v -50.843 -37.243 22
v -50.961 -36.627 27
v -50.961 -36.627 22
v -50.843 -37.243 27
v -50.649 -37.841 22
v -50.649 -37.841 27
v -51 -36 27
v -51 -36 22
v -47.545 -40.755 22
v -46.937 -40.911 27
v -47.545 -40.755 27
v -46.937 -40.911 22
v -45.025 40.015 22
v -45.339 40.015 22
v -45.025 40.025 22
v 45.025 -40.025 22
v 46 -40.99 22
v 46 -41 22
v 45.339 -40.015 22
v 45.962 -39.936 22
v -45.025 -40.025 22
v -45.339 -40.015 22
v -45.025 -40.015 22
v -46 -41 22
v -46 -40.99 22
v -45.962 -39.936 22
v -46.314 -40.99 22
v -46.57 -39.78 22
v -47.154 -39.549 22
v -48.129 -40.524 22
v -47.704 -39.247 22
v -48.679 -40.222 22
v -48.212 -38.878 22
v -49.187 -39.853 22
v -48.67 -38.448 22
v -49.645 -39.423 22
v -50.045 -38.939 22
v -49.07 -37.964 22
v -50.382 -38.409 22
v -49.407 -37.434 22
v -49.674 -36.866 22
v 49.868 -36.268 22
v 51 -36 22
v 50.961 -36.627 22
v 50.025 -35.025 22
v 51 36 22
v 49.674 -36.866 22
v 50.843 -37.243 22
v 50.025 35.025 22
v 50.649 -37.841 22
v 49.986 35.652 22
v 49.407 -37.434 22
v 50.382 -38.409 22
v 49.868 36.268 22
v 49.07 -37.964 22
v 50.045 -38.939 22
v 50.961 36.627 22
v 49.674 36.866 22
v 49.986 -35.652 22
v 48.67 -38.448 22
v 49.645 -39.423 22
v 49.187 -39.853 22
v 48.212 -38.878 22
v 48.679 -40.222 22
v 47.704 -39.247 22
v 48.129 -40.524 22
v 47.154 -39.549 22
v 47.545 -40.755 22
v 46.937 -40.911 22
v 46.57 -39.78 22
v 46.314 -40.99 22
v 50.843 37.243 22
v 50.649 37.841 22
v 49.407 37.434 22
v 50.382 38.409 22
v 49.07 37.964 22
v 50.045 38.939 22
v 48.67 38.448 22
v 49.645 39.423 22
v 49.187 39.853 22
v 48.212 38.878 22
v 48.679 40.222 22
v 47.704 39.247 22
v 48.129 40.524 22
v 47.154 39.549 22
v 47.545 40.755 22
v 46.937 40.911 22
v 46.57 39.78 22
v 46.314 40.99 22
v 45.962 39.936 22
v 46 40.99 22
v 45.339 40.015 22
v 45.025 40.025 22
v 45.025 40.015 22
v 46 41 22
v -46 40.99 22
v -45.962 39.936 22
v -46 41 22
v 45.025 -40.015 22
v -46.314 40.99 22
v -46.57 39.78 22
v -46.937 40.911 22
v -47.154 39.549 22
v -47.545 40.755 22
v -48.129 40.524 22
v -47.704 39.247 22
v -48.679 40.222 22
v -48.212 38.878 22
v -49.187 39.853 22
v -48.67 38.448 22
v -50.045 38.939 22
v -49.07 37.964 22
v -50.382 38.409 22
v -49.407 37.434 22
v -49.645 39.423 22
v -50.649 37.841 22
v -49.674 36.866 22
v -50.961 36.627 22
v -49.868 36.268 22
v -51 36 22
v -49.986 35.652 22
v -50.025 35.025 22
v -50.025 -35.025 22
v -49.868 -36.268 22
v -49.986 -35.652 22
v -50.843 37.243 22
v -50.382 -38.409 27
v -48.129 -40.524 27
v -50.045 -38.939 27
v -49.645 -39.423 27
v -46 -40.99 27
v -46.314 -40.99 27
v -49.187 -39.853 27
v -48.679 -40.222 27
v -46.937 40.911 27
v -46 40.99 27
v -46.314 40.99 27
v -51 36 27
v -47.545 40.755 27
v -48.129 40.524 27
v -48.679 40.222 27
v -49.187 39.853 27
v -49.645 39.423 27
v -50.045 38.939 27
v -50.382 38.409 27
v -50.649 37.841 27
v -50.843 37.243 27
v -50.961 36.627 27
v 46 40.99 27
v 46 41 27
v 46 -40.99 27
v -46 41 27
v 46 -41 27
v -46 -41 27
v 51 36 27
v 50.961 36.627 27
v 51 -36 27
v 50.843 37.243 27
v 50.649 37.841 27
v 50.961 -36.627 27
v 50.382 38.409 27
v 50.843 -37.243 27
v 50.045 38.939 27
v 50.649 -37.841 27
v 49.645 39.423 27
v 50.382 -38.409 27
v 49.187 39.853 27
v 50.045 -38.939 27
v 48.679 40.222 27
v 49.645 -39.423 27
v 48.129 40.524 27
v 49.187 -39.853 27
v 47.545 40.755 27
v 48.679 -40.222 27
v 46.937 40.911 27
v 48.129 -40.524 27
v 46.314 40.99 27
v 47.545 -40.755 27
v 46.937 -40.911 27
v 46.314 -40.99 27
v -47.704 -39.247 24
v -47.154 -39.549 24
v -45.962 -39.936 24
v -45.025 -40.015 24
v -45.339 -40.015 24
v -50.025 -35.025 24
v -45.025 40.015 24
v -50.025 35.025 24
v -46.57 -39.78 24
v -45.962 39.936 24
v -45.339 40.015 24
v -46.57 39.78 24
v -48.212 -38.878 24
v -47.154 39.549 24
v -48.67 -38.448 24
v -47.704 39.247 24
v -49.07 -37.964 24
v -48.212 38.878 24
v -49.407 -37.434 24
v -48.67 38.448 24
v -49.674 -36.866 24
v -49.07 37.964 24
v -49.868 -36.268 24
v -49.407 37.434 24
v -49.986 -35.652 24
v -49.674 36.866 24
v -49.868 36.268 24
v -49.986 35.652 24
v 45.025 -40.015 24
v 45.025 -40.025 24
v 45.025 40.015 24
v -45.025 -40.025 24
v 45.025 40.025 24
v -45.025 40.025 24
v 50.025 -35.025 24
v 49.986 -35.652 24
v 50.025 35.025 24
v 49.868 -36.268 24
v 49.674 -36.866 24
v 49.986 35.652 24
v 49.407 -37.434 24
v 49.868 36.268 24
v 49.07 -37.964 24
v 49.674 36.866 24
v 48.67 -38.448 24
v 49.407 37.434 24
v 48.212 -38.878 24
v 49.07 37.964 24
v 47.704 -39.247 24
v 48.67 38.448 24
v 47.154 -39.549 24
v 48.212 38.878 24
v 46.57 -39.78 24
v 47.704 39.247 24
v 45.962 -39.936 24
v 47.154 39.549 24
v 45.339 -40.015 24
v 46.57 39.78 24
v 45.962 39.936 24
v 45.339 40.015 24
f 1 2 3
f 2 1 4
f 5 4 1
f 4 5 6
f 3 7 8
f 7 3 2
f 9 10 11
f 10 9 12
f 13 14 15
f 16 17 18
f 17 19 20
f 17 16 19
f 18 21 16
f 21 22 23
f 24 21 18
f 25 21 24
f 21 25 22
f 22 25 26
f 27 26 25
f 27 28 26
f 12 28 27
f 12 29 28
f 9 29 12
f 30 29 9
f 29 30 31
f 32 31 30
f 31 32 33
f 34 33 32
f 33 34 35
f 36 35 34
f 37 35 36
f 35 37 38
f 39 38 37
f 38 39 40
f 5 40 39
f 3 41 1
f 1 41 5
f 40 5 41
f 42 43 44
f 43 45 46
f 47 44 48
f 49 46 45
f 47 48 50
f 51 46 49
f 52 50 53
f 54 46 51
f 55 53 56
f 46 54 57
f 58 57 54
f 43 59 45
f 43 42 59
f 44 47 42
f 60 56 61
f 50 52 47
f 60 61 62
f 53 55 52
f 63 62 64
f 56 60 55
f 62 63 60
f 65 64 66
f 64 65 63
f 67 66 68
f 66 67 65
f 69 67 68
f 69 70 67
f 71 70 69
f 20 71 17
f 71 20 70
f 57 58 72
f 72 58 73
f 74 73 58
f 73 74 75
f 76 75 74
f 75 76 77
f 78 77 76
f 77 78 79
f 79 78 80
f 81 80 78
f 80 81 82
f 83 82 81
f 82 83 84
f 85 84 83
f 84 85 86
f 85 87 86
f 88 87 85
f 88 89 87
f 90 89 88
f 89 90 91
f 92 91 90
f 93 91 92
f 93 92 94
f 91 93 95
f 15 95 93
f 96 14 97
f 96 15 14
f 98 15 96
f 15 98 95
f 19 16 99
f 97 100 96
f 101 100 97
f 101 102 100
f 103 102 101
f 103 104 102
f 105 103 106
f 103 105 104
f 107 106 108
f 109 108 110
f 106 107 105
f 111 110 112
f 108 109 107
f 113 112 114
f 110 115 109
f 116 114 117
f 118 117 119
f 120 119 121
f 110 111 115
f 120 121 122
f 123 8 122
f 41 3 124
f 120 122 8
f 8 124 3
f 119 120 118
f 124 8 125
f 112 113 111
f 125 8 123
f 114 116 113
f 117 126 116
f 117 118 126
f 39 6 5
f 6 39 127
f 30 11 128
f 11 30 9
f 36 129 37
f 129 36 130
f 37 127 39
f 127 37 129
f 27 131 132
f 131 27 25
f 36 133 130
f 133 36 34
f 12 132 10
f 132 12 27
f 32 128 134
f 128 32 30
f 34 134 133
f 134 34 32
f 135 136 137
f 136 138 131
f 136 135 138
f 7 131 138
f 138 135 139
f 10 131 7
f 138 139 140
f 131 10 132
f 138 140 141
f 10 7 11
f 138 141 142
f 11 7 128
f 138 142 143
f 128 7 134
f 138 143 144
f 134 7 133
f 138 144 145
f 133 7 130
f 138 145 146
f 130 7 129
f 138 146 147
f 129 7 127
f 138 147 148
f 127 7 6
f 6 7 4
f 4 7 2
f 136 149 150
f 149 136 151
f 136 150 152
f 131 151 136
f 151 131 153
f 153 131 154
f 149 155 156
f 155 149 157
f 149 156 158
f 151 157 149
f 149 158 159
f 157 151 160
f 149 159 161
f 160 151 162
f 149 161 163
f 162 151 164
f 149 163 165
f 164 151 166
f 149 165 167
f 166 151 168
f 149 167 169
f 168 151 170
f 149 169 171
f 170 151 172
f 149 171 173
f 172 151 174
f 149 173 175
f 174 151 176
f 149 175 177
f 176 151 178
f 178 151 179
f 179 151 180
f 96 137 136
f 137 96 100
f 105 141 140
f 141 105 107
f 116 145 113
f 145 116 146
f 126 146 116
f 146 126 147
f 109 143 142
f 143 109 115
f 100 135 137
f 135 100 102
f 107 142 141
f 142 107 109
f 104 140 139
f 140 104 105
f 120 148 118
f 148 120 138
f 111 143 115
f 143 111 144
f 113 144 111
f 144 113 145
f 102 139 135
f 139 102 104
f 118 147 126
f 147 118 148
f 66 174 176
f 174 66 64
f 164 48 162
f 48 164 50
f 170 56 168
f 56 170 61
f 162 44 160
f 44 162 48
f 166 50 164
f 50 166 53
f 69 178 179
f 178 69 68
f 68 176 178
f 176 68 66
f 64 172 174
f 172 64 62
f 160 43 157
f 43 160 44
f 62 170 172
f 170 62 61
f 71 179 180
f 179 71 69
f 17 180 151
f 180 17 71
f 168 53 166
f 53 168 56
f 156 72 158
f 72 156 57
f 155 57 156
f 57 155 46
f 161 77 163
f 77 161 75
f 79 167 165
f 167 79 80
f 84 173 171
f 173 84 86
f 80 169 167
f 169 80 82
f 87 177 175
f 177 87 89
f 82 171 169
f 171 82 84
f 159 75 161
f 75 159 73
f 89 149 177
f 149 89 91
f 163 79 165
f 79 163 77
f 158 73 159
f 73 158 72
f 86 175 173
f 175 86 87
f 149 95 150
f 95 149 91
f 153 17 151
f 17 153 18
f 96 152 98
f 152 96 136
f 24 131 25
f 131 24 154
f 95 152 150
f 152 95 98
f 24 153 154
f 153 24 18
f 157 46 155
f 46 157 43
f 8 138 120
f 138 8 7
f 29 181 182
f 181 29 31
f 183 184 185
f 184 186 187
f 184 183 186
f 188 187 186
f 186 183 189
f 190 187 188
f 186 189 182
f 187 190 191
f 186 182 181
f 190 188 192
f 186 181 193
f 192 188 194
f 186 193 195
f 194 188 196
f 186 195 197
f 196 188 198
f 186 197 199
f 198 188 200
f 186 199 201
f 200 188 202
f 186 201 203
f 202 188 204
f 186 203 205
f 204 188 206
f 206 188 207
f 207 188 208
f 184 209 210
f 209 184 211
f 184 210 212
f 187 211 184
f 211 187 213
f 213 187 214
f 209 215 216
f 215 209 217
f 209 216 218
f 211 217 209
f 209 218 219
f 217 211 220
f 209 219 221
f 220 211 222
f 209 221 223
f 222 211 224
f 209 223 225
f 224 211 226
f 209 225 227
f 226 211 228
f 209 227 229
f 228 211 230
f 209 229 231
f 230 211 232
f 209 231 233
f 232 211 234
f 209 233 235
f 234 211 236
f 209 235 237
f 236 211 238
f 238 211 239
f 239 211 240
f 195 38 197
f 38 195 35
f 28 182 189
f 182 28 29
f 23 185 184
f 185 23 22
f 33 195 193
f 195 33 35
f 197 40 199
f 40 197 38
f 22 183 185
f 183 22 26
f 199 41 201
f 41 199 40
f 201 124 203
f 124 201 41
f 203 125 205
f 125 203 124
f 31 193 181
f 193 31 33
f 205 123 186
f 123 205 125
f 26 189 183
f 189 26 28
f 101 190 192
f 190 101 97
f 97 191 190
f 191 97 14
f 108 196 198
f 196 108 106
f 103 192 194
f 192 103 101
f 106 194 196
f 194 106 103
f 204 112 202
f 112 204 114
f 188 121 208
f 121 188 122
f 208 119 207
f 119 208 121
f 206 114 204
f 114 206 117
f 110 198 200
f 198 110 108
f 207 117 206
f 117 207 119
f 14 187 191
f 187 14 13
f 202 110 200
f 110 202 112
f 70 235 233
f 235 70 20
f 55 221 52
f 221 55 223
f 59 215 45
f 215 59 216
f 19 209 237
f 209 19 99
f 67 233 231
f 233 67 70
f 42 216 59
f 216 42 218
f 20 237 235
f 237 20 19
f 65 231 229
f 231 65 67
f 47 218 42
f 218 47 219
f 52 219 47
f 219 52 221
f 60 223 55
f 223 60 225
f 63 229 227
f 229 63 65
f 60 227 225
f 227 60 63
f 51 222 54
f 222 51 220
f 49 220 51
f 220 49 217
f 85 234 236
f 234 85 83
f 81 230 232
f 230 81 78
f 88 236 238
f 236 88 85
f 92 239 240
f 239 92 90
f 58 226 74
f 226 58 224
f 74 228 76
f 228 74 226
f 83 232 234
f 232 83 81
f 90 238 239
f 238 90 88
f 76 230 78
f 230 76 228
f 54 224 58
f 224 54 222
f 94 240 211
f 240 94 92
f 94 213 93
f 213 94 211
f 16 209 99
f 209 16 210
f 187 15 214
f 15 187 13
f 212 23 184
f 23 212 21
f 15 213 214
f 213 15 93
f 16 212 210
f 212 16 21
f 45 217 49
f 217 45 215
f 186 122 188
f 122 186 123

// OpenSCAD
include <MCAD/boxes.scad>
include <MCAD/nuts_and_bolts.scad>

$fn = 50;

pcb_dim = [ 90, 70, 10];
hole_size = 2.4;

//height of case bottom
h = 24;
//height of base top
h_t = 5;

pcb_case_top();
//pcb_case_bottom();
//pcb_case_top();

//pcb(10);
//_pcb_holes(1,10);

module pcb_case_bottom()
{
    difference()
    {
        union()
        {
            _pcb_case_bottom();
            _pcb_holes(5,10);
        }
        _pcb_holes(2/2,10);
        pcb(10);
    }
}

module _pcb_case_bottom()
{
    
    translate([0,0,(h+pcb_dim[2]+10)/2]) difference()
    {
        roundedBox([pcb_dim[0]+10, pcb_dim[1]+10, h+pcb_dim[2]+10], 5, true);
        translate([0,0,3]) roundedBox([pcb_dim[0]+8, pcb_dim[1]+8, h+pcb_dim[2]+10], 5, true);
    }
}

module pcb_case_top()
{
    difference()
    {
       _pcb_case_top(h)
       #pcb(20);
    }
}

module _pcb_case_top(ht)
{
    translate([0,0,h_t/2-2 + ht]) difference()
    {
        roundedBox([pcb_dim[0]+12, pcb_dim[1]+12, h_t], 5, true);
        translate([0,0,-h_t+2]) roundedBox([pcb_dim[0]+10.05, pcb_dim[1]+10.05, h_t], 5, true);
    }
}

module pcb(ht)
{
    translate([-pcb_dim[0]/2, -pcb_dim[1]/2,ht]) 
    {
        cube( pcb_dim );
        translate([pcb_dim[0] - 14, 0, ht]) cube([14,19,24]);
        for( i = [ 0:4 ] )
            translate([pcb_dim[0] - 14, i*4, ht]) cube([30,2,21]);
        
        translate([-10, 10, ht+10]) cube([12,12,11]);
        translate([51, 14/2, ht]) cylinder(r = 14/2, h = 40);
        translate([3.5,38, ht]) cube([71.1+2,24+2,30]);
        translate([pcb_dim[0], 30, ht]) rotate([0,90,0]) cylinder(r = 8/2, h = 10);
    }    
    
}

module _pcb_holes(hole_r, ht)
{
    translate([-pcb_dim[0]/2, -pcb_dim[1]/2,0]) 
    {
        translate([ 1+hole_size/2, 1+hole_size/2, 0 ] ) cylindepcb_case_topr( h = ht, r = hole_r);
            translate([pcb_dim[0]-hole_size/2-1, 1+hole_size/2]) cylinder( h = ht, r = hole_r);
            translate([ 1+hole_size/2, pcb_dim[1]-1-hole_size/2, 0 ] ) cylinder( h = ht, r = hole_r);
            translate([pcb_dim[0]-hole_size/2-1, pcb_dim[1]-hole_size/2-1]) cylinder( h = ht, r = hole_r);
    }
}
